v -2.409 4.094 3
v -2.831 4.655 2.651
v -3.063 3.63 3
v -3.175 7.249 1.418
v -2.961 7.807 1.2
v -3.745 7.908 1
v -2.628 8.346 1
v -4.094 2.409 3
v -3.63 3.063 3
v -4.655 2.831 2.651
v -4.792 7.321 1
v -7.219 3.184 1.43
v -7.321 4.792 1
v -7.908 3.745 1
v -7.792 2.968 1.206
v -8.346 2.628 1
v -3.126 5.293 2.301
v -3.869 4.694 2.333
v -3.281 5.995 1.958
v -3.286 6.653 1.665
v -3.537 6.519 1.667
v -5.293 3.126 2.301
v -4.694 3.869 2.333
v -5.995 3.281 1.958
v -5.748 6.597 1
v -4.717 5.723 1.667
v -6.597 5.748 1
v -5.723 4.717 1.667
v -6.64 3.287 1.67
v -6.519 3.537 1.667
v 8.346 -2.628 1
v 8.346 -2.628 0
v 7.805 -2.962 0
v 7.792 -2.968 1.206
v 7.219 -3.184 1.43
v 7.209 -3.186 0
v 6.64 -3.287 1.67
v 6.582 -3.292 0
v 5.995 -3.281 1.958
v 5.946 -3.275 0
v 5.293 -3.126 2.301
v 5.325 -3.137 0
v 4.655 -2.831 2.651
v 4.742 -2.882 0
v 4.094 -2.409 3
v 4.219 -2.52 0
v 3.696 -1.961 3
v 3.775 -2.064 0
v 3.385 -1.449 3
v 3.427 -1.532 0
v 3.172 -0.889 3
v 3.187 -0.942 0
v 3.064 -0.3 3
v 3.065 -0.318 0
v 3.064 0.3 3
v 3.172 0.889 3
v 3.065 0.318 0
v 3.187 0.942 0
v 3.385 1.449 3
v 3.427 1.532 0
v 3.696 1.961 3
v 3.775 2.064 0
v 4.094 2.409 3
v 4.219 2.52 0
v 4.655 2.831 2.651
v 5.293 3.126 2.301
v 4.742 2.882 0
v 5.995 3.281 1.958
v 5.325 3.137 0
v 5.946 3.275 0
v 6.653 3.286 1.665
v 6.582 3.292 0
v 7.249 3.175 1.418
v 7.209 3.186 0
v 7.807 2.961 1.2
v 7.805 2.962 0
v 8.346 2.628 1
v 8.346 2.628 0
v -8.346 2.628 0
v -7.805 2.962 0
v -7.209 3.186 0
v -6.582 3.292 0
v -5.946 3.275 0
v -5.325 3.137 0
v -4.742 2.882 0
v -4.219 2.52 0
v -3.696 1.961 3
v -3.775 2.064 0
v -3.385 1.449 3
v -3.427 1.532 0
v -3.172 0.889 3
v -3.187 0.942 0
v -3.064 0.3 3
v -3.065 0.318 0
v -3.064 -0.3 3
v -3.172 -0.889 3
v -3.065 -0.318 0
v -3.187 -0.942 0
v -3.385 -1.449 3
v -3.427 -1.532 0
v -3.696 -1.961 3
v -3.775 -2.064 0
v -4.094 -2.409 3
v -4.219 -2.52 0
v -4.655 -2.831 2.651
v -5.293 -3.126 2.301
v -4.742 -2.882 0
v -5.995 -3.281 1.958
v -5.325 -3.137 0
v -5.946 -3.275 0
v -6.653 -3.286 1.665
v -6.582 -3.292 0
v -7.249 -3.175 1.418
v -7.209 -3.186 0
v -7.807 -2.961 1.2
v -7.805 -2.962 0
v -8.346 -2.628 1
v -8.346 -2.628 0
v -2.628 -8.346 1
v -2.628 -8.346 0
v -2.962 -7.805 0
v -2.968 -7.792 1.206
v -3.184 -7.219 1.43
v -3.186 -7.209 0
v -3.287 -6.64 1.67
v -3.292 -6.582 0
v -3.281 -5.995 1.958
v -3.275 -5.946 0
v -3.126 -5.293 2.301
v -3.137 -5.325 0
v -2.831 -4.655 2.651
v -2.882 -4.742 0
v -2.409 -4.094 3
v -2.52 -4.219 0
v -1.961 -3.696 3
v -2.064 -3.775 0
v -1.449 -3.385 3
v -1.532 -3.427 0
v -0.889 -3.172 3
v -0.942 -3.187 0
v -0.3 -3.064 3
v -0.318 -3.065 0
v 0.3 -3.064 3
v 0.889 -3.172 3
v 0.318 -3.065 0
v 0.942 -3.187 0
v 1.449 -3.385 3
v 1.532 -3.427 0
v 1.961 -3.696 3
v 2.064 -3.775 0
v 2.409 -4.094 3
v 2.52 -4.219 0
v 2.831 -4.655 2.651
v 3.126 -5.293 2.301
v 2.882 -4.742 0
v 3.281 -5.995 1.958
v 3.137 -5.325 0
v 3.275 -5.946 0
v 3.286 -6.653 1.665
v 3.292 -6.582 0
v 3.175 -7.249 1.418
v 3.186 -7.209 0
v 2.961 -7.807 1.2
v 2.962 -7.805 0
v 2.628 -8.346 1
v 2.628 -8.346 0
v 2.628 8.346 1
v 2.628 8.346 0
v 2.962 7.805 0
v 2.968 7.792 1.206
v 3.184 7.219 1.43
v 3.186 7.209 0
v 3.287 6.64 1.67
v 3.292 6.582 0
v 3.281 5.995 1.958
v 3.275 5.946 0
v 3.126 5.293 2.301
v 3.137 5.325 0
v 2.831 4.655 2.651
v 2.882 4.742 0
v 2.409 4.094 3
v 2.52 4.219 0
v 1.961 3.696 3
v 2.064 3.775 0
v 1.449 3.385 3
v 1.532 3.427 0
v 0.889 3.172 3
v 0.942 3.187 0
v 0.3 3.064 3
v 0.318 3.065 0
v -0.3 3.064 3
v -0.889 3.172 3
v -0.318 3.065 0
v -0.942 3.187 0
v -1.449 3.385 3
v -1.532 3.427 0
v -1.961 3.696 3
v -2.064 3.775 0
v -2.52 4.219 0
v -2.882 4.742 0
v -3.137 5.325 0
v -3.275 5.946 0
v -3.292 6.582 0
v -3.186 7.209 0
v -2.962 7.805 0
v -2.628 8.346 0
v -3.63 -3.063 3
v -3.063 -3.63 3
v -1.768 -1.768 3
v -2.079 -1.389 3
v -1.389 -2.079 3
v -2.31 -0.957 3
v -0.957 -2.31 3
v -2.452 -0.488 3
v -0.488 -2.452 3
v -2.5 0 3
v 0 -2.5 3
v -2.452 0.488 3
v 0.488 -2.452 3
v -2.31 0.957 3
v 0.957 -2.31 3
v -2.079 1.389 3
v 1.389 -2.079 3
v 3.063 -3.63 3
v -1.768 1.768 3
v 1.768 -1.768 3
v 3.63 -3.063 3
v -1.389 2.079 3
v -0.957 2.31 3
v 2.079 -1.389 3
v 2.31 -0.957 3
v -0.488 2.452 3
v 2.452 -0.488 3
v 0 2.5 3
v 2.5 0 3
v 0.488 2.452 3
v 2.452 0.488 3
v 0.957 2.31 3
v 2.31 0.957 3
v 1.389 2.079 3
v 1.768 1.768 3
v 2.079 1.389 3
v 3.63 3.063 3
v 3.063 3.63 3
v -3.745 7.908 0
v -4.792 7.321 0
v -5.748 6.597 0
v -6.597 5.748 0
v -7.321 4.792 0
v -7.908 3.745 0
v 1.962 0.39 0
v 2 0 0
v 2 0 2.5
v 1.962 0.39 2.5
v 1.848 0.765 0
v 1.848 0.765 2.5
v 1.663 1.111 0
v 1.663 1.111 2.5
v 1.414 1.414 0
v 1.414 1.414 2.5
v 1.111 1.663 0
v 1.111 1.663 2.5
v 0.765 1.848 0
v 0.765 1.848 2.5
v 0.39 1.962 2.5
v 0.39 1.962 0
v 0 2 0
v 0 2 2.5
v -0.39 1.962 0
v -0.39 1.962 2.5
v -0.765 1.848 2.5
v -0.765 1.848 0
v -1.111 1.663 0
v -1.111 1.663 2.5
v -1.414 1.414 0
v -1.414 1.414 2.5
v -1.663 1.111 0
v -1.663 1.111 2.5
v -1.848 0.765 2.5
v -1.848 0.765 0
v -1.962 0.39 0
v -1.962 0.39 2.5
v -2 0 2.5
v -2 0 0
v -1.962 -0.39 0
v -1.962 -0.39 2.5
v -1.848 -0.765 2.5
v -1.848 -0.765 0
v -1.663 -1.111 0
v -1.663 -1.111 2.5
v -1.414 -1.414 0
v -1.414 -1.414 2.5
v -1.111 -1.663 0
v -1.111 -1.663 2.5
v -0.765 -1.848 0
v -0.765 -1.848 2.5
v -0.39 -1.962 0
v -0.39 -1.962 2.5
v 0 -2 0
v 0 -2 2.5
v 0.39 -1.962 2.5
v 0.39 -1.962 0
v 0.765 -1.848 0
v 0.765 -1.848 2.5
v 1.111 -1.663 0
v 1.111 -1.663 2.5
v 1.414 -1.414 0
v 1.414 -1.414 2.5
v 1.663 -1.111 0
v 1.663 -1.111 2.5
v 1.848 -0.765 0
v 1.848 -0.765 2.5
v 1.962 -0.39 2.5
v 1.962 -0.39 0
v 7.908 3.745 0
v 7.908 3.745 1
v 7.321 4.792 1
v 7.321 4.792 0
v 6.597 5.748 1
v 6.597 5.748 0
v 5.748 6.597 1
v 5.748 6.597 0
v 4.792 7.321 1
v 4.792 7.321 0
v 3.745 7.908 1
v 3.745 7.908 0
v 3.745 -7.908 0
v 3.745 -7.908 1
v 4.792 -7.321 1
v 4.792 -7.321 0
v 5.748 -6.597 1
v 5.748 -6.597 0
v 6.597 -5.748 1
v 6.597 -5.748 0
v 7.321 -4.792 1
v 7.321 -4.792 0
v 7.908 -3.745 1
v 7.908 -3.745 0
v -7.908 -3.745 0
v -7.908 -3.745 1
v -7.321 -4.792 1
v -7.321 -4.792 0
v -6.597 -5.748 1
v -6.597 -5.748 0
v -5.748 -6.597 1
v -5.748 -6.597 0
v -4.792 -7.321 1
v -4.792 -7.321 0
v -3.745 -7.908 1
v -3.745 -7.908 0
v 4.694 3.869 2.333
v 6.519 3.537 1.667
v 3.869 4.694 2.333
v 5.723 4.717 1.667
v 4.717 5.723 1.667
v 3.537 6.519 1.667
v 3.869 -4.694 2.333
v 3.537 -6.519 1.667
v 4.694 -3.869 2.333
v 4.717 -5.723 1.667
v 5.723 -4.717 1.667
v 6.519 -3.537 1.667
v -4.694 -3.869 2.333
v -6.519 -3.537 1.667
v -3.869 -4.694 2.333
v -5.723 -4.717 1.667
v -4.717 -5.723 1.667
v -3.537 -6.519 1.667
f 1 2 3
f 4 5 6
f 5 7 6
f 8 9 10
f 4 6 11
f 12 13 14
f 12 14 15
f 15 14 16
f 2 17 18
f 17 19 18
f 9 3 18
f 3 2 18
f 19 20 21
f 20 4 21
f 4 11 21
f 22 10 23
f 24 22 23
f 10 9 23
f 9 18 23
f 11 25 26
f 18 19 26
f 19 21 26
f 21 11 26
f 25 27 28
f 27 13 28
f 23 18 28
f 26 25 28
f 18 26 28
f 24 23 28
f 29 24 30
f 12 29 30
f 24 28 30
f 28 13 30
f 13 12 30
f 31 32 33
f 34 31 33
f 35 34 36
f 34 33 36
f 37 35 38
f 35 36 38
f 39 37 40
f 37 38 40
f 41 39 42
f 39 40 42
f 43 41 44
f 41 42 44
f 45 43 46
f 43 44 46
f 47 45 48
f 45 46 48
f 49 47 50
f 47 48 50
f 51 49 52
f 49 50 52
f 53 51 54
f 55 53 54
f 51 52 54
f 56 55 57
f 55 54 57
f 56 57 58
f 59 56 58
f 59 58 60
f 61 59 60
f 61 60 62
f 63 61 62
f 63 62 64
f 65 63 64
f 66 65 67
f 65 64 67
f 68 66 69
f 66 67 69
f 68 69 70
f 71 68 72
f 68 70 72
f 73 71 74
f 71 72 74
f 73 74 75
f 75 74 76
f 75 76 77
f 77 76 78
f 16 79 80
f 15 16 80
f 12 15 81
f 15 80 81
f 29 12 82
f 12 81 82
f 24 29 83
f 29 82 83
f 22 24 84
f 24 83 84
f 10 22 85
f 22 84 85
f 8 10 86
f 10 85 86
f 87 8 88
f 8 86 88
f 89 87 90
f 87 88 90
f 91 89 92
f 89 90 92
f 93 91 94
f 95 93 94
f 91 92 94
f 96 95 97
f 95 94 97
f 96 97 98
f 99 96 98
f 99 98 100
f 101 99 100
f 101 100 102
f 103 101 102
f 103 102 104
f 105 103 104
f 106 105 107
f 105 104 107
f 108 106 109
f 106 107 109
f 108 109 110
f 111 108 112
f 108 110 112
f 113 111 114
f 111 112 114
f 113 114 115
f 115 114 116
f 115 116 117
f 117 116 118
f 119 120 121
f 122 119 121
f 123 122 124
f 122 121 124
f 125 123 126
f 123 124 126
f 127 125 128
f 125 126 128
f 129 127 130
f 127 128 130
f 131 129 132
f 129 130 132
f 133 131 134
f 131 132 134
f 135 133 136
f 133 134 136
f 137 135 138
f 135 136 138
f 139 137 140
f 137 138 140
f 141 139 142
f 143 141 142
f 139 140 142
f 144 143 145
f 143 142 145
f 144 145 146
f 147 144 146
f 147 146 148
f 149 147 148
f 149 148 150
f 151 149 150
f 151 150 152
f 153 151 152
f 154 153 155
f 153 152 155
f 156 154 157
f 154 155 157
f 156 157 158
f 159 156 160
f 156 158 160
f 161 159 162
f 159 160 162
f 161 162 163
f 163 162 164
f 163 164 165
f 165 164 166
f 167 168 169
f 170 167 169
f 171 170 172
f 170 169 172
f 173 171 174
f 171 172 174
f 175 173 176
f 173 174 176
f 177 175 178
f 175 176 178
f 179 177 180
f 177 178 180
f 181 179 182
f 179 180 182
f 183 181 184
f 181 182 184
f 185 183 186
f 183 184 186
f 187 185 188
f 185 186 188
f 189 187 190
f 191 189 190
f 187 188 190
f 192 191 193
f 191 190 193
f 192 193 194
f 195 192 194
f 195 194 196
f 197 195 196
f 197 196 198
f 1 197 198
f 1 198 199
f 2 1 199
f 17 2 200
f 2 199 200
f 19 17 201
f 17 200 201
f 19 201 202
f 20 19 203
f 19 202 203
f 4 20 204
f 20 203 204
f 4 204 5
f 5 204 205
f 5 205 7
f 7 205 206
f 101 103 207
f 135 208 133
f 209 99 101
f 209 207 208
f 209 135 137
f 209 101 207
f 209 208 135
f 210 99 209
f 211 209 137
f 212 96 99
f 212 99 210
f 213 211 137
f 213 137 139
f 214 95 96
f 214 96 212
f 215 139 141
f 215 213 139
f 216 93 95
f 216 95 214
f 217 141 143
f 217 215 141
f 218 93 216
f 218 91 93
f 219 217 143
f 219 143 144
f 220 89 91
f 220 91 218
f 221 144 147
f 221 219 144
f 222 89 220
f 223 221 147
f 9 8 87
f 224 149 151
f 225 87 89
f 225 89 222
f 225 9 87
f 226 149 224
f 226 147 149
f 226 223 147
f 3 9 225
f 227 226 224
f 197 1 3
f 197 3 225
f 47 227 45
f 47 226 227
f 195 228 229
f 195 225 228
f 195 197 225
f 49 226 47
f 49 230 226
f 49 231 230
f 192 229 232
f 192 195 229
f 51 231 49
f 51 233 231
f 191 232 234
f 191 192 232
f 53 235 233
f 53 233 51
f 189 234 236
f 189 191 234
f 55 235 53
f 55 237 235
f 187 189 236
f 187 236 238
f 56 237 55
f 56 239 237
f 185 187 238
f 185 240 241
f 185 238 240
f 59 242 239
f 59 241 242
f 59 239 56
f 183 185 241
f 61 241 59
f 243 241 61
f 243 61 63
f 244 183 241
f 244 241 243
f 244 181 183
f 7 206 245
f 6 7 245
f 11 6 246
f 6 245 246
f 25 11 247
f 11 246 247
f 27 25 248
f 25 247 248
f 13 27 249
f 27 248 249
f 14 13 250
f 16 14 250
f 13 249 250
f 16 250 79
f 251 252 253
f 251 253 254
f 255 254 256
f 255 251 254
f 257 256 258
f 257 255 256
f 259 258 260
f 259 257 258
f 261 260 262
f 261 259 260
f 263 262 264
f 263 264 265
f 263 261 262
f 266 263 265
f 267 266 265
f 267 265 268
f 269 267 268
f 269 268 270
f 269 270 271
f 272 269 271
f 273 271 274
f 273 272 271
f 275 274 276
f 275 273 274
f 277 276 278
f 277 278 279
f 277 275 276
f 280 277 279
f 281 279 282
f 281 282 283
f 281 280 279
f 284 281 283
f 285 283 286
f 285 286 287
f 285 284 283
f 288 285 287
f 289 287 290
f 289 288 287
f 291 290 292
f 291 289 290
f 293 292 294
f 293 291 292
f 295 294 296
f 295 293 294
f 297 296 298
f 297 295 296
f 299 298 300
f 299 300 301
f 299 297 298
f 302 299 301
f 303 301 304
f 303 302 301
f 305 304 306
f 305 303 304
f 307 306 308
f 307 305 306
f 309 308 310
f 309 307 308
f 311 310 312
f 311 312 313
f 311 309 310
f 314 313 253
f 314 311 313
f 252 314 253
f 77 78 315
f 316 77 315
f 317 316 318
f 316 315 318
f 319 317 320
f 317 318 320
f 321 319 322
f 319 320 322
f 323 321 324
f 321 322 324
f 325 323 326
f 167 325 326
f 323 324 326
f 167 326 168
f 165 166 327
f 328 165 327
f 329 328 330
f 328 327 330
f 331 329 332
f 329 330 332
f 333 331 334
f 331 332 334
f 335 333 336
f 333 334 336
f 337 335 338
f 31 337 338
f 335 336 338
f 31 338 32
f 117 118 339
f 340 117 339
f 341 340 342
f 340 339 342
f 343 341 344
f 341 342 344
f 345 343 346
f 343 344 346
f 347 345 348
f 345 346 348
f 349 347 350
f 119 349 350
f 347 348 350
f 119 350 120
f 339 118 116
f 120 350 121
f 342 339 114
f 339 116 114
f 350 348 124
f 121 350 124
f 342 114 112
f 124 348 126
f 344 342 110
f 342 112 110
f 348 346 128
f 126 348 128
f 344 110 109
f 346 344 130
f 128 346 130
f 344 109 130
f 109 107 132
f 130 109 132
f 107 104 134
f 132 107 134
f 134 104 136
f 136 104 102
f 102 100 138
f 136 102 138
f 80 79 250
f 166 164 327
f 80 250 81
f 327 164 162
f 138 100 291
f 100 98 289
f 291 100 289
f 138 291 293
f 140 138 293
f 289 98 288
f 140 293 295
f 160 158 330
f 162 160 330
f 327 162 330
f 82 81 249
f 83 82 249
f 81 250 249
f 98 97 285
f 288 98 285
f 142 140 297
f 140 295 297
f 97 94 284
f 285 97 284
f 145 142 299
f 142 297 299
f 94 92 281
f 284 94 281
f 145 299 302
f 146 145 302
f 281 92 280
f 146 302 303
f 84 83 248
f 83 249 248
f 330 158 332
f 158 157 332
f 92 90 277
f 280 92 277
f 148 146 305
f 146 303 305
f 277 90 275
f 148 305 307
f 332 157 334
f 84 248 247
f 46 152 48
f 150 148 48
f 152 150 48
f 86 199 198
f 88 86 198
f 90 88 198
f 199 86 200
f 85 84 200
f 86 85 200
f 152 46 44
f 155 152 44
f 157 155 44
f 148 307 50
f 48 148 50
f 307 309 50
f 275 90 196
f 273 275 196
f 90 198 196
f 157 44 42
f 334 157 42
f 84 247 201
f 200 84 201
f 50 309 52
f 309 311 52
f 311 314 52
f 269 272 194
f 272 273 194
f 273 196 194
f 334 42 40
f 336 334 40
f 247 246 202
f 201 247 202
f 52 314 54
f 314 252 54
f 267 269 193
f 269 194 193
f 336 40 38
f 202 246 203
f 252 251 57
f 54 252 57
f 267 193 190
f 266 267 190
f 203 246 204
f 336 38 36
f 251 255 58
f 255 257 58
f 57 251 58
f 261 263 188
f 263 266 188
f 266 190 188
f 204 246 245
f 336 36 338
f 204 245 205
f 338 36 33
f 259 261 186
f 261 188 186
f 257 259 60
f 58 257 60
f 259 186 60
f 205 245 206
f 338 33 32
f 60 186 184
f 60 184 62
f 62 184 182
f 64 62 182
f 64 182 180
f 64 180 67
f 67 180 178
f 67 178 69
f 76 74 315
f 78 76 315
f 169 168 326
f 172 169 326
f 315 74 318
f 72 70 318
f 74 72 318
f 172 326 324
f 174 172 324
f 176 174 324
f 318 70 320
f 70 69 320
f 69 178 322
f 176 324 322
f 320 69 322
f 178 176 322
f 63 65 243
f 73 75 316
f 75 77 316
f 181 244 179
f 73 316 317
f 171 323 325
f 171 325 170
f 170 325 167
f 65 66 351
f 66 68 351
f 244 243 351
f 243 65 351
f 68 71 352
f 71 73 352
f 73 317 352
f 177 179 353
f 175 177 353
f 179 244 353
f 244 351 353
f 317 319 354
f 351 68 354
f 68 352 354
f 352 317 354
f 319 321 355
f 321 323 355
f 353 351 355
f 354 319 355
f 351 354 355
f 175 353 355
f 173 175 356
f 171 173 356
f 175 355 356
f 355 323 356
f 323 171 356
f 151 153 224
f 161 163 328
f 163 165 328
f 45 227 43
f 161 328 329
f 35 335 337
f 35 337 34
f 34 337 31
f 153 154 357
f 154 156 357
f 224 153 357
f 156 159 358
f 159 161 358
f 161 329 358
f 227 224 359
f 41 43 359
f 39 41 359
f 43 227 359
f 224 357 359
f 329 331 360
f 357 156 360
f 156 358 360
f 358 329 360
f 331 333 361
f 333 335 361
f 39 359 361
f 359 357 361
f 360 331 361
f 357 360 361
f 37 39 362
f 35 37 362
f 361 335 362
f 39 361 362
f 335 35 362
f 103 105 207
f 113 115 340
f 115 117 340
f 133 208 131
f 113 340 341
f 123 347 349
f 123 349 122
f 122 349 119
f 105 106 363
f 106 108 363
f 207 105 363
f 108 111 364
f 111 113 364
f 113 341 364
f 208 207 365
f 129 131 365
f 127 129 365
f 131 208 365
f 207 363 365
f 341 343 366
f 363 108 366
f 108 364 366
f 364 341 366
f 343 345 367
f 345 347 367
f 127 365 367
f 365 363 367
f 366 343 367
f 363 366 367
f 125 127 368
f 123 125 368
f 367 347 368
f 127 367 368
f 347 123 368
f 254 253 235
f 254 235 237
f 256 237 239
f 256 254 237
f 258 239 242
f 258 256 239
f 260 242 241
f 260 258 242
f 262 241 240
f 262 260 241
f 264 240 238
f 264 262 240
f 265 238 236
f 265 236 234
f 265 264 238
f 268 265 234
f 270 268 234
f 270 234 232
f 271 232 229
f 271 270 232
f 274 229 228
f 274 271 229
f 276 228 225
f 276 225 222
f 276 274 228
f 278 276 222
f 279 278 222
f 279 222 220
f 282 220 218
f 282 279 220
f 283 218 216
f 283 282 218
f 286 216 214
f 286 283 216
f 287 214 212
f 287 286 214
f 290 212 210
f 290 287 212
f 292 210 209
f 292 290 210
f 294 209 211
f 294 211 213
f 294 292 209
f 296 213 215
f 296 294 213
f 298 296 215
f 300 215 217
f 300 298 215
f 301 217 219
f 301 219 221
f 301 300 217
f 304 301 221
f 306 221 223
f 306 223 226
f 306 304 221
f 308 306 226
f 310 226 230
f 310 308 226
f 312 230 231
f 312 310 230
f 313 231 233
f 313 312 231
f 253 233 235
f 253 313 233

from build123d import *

# Parameters (mm, degrees)
F0_R     = 2
F1_DEPTH = 3
F2_SIZE2 = 2
F2_SIZE  = 4
F3_SIZE  = 0.5


with BuildPart() as f1:
    # F0 (on Top) → F1 (new body)
    with BuildSketch(Plane.XY):
        with BuildLine():
            ThreePointArc((-8.3460629921, 2.6278760495), (-3.05, 0), (-8.3460629921, -2.6278760495))
            ThreePointArc((-8.3460629921, -2.6278760495), (-6.1871843354, -6.1871843354), (-2.6278760495, -8.3460629921))
            ThreePointArc((-2.6278760495, -8.3460629921), (0, -3.05), (2.6278760495, -8.3460629921))
            ThreePointArc((2.6278760495, -8.3460629921), (6.1871843354, -6.1871843354), (8.3460629921, -2.6278760495))
            ThreePointArc((8.3460629921, -2.6278760495), (3.05, 0), (8.3460629921, 2.6278760495))
            ThreePointArc((8.3460629921, 2.6278760495), (6.1871843354, 6.1871843354), (2.6278760495, 8.3460629921))
            ThreePointArc((2.6278760495, 8.3460629921), (0, 3.05), (-2.6278760495, 8.3460629921))
            ThreePointArc((-2.6278760495, 8.3460629921), (-6.1871843354, 6.1871843354), (-8.3460629921, 2.6278760495))
        make_face()
        Circle(F0_R, mode=Mode.SUBTRACT)
    extrude(amount=F1_DEPTH)

    # F2
    f2_edges = [f1.edges().sort_by_distance(p)[0] for p in [
        (-6.187184, 6.187184, 3),
        (-6.187184, -6.187184, 3),
        (6.187184, -6.187184, 3),
        (6.187184, 6.187184, 3),
    ]]
    f2_side = f1.faces().sort_by_distance((-6.020263, 6.020263, 3))[0]
    chamfer(f2_edges, length=F2_SIZE, length2=F2_SIZE2, reference=f2_side)

    # F3
    f3_edges = [f1.edges().sort_by_distance(p)[0] for p in [
        (-2, 0, 3),
    ]]
    chamfer(f3_edges, length=F3_SIZE)


solid = f1.part
